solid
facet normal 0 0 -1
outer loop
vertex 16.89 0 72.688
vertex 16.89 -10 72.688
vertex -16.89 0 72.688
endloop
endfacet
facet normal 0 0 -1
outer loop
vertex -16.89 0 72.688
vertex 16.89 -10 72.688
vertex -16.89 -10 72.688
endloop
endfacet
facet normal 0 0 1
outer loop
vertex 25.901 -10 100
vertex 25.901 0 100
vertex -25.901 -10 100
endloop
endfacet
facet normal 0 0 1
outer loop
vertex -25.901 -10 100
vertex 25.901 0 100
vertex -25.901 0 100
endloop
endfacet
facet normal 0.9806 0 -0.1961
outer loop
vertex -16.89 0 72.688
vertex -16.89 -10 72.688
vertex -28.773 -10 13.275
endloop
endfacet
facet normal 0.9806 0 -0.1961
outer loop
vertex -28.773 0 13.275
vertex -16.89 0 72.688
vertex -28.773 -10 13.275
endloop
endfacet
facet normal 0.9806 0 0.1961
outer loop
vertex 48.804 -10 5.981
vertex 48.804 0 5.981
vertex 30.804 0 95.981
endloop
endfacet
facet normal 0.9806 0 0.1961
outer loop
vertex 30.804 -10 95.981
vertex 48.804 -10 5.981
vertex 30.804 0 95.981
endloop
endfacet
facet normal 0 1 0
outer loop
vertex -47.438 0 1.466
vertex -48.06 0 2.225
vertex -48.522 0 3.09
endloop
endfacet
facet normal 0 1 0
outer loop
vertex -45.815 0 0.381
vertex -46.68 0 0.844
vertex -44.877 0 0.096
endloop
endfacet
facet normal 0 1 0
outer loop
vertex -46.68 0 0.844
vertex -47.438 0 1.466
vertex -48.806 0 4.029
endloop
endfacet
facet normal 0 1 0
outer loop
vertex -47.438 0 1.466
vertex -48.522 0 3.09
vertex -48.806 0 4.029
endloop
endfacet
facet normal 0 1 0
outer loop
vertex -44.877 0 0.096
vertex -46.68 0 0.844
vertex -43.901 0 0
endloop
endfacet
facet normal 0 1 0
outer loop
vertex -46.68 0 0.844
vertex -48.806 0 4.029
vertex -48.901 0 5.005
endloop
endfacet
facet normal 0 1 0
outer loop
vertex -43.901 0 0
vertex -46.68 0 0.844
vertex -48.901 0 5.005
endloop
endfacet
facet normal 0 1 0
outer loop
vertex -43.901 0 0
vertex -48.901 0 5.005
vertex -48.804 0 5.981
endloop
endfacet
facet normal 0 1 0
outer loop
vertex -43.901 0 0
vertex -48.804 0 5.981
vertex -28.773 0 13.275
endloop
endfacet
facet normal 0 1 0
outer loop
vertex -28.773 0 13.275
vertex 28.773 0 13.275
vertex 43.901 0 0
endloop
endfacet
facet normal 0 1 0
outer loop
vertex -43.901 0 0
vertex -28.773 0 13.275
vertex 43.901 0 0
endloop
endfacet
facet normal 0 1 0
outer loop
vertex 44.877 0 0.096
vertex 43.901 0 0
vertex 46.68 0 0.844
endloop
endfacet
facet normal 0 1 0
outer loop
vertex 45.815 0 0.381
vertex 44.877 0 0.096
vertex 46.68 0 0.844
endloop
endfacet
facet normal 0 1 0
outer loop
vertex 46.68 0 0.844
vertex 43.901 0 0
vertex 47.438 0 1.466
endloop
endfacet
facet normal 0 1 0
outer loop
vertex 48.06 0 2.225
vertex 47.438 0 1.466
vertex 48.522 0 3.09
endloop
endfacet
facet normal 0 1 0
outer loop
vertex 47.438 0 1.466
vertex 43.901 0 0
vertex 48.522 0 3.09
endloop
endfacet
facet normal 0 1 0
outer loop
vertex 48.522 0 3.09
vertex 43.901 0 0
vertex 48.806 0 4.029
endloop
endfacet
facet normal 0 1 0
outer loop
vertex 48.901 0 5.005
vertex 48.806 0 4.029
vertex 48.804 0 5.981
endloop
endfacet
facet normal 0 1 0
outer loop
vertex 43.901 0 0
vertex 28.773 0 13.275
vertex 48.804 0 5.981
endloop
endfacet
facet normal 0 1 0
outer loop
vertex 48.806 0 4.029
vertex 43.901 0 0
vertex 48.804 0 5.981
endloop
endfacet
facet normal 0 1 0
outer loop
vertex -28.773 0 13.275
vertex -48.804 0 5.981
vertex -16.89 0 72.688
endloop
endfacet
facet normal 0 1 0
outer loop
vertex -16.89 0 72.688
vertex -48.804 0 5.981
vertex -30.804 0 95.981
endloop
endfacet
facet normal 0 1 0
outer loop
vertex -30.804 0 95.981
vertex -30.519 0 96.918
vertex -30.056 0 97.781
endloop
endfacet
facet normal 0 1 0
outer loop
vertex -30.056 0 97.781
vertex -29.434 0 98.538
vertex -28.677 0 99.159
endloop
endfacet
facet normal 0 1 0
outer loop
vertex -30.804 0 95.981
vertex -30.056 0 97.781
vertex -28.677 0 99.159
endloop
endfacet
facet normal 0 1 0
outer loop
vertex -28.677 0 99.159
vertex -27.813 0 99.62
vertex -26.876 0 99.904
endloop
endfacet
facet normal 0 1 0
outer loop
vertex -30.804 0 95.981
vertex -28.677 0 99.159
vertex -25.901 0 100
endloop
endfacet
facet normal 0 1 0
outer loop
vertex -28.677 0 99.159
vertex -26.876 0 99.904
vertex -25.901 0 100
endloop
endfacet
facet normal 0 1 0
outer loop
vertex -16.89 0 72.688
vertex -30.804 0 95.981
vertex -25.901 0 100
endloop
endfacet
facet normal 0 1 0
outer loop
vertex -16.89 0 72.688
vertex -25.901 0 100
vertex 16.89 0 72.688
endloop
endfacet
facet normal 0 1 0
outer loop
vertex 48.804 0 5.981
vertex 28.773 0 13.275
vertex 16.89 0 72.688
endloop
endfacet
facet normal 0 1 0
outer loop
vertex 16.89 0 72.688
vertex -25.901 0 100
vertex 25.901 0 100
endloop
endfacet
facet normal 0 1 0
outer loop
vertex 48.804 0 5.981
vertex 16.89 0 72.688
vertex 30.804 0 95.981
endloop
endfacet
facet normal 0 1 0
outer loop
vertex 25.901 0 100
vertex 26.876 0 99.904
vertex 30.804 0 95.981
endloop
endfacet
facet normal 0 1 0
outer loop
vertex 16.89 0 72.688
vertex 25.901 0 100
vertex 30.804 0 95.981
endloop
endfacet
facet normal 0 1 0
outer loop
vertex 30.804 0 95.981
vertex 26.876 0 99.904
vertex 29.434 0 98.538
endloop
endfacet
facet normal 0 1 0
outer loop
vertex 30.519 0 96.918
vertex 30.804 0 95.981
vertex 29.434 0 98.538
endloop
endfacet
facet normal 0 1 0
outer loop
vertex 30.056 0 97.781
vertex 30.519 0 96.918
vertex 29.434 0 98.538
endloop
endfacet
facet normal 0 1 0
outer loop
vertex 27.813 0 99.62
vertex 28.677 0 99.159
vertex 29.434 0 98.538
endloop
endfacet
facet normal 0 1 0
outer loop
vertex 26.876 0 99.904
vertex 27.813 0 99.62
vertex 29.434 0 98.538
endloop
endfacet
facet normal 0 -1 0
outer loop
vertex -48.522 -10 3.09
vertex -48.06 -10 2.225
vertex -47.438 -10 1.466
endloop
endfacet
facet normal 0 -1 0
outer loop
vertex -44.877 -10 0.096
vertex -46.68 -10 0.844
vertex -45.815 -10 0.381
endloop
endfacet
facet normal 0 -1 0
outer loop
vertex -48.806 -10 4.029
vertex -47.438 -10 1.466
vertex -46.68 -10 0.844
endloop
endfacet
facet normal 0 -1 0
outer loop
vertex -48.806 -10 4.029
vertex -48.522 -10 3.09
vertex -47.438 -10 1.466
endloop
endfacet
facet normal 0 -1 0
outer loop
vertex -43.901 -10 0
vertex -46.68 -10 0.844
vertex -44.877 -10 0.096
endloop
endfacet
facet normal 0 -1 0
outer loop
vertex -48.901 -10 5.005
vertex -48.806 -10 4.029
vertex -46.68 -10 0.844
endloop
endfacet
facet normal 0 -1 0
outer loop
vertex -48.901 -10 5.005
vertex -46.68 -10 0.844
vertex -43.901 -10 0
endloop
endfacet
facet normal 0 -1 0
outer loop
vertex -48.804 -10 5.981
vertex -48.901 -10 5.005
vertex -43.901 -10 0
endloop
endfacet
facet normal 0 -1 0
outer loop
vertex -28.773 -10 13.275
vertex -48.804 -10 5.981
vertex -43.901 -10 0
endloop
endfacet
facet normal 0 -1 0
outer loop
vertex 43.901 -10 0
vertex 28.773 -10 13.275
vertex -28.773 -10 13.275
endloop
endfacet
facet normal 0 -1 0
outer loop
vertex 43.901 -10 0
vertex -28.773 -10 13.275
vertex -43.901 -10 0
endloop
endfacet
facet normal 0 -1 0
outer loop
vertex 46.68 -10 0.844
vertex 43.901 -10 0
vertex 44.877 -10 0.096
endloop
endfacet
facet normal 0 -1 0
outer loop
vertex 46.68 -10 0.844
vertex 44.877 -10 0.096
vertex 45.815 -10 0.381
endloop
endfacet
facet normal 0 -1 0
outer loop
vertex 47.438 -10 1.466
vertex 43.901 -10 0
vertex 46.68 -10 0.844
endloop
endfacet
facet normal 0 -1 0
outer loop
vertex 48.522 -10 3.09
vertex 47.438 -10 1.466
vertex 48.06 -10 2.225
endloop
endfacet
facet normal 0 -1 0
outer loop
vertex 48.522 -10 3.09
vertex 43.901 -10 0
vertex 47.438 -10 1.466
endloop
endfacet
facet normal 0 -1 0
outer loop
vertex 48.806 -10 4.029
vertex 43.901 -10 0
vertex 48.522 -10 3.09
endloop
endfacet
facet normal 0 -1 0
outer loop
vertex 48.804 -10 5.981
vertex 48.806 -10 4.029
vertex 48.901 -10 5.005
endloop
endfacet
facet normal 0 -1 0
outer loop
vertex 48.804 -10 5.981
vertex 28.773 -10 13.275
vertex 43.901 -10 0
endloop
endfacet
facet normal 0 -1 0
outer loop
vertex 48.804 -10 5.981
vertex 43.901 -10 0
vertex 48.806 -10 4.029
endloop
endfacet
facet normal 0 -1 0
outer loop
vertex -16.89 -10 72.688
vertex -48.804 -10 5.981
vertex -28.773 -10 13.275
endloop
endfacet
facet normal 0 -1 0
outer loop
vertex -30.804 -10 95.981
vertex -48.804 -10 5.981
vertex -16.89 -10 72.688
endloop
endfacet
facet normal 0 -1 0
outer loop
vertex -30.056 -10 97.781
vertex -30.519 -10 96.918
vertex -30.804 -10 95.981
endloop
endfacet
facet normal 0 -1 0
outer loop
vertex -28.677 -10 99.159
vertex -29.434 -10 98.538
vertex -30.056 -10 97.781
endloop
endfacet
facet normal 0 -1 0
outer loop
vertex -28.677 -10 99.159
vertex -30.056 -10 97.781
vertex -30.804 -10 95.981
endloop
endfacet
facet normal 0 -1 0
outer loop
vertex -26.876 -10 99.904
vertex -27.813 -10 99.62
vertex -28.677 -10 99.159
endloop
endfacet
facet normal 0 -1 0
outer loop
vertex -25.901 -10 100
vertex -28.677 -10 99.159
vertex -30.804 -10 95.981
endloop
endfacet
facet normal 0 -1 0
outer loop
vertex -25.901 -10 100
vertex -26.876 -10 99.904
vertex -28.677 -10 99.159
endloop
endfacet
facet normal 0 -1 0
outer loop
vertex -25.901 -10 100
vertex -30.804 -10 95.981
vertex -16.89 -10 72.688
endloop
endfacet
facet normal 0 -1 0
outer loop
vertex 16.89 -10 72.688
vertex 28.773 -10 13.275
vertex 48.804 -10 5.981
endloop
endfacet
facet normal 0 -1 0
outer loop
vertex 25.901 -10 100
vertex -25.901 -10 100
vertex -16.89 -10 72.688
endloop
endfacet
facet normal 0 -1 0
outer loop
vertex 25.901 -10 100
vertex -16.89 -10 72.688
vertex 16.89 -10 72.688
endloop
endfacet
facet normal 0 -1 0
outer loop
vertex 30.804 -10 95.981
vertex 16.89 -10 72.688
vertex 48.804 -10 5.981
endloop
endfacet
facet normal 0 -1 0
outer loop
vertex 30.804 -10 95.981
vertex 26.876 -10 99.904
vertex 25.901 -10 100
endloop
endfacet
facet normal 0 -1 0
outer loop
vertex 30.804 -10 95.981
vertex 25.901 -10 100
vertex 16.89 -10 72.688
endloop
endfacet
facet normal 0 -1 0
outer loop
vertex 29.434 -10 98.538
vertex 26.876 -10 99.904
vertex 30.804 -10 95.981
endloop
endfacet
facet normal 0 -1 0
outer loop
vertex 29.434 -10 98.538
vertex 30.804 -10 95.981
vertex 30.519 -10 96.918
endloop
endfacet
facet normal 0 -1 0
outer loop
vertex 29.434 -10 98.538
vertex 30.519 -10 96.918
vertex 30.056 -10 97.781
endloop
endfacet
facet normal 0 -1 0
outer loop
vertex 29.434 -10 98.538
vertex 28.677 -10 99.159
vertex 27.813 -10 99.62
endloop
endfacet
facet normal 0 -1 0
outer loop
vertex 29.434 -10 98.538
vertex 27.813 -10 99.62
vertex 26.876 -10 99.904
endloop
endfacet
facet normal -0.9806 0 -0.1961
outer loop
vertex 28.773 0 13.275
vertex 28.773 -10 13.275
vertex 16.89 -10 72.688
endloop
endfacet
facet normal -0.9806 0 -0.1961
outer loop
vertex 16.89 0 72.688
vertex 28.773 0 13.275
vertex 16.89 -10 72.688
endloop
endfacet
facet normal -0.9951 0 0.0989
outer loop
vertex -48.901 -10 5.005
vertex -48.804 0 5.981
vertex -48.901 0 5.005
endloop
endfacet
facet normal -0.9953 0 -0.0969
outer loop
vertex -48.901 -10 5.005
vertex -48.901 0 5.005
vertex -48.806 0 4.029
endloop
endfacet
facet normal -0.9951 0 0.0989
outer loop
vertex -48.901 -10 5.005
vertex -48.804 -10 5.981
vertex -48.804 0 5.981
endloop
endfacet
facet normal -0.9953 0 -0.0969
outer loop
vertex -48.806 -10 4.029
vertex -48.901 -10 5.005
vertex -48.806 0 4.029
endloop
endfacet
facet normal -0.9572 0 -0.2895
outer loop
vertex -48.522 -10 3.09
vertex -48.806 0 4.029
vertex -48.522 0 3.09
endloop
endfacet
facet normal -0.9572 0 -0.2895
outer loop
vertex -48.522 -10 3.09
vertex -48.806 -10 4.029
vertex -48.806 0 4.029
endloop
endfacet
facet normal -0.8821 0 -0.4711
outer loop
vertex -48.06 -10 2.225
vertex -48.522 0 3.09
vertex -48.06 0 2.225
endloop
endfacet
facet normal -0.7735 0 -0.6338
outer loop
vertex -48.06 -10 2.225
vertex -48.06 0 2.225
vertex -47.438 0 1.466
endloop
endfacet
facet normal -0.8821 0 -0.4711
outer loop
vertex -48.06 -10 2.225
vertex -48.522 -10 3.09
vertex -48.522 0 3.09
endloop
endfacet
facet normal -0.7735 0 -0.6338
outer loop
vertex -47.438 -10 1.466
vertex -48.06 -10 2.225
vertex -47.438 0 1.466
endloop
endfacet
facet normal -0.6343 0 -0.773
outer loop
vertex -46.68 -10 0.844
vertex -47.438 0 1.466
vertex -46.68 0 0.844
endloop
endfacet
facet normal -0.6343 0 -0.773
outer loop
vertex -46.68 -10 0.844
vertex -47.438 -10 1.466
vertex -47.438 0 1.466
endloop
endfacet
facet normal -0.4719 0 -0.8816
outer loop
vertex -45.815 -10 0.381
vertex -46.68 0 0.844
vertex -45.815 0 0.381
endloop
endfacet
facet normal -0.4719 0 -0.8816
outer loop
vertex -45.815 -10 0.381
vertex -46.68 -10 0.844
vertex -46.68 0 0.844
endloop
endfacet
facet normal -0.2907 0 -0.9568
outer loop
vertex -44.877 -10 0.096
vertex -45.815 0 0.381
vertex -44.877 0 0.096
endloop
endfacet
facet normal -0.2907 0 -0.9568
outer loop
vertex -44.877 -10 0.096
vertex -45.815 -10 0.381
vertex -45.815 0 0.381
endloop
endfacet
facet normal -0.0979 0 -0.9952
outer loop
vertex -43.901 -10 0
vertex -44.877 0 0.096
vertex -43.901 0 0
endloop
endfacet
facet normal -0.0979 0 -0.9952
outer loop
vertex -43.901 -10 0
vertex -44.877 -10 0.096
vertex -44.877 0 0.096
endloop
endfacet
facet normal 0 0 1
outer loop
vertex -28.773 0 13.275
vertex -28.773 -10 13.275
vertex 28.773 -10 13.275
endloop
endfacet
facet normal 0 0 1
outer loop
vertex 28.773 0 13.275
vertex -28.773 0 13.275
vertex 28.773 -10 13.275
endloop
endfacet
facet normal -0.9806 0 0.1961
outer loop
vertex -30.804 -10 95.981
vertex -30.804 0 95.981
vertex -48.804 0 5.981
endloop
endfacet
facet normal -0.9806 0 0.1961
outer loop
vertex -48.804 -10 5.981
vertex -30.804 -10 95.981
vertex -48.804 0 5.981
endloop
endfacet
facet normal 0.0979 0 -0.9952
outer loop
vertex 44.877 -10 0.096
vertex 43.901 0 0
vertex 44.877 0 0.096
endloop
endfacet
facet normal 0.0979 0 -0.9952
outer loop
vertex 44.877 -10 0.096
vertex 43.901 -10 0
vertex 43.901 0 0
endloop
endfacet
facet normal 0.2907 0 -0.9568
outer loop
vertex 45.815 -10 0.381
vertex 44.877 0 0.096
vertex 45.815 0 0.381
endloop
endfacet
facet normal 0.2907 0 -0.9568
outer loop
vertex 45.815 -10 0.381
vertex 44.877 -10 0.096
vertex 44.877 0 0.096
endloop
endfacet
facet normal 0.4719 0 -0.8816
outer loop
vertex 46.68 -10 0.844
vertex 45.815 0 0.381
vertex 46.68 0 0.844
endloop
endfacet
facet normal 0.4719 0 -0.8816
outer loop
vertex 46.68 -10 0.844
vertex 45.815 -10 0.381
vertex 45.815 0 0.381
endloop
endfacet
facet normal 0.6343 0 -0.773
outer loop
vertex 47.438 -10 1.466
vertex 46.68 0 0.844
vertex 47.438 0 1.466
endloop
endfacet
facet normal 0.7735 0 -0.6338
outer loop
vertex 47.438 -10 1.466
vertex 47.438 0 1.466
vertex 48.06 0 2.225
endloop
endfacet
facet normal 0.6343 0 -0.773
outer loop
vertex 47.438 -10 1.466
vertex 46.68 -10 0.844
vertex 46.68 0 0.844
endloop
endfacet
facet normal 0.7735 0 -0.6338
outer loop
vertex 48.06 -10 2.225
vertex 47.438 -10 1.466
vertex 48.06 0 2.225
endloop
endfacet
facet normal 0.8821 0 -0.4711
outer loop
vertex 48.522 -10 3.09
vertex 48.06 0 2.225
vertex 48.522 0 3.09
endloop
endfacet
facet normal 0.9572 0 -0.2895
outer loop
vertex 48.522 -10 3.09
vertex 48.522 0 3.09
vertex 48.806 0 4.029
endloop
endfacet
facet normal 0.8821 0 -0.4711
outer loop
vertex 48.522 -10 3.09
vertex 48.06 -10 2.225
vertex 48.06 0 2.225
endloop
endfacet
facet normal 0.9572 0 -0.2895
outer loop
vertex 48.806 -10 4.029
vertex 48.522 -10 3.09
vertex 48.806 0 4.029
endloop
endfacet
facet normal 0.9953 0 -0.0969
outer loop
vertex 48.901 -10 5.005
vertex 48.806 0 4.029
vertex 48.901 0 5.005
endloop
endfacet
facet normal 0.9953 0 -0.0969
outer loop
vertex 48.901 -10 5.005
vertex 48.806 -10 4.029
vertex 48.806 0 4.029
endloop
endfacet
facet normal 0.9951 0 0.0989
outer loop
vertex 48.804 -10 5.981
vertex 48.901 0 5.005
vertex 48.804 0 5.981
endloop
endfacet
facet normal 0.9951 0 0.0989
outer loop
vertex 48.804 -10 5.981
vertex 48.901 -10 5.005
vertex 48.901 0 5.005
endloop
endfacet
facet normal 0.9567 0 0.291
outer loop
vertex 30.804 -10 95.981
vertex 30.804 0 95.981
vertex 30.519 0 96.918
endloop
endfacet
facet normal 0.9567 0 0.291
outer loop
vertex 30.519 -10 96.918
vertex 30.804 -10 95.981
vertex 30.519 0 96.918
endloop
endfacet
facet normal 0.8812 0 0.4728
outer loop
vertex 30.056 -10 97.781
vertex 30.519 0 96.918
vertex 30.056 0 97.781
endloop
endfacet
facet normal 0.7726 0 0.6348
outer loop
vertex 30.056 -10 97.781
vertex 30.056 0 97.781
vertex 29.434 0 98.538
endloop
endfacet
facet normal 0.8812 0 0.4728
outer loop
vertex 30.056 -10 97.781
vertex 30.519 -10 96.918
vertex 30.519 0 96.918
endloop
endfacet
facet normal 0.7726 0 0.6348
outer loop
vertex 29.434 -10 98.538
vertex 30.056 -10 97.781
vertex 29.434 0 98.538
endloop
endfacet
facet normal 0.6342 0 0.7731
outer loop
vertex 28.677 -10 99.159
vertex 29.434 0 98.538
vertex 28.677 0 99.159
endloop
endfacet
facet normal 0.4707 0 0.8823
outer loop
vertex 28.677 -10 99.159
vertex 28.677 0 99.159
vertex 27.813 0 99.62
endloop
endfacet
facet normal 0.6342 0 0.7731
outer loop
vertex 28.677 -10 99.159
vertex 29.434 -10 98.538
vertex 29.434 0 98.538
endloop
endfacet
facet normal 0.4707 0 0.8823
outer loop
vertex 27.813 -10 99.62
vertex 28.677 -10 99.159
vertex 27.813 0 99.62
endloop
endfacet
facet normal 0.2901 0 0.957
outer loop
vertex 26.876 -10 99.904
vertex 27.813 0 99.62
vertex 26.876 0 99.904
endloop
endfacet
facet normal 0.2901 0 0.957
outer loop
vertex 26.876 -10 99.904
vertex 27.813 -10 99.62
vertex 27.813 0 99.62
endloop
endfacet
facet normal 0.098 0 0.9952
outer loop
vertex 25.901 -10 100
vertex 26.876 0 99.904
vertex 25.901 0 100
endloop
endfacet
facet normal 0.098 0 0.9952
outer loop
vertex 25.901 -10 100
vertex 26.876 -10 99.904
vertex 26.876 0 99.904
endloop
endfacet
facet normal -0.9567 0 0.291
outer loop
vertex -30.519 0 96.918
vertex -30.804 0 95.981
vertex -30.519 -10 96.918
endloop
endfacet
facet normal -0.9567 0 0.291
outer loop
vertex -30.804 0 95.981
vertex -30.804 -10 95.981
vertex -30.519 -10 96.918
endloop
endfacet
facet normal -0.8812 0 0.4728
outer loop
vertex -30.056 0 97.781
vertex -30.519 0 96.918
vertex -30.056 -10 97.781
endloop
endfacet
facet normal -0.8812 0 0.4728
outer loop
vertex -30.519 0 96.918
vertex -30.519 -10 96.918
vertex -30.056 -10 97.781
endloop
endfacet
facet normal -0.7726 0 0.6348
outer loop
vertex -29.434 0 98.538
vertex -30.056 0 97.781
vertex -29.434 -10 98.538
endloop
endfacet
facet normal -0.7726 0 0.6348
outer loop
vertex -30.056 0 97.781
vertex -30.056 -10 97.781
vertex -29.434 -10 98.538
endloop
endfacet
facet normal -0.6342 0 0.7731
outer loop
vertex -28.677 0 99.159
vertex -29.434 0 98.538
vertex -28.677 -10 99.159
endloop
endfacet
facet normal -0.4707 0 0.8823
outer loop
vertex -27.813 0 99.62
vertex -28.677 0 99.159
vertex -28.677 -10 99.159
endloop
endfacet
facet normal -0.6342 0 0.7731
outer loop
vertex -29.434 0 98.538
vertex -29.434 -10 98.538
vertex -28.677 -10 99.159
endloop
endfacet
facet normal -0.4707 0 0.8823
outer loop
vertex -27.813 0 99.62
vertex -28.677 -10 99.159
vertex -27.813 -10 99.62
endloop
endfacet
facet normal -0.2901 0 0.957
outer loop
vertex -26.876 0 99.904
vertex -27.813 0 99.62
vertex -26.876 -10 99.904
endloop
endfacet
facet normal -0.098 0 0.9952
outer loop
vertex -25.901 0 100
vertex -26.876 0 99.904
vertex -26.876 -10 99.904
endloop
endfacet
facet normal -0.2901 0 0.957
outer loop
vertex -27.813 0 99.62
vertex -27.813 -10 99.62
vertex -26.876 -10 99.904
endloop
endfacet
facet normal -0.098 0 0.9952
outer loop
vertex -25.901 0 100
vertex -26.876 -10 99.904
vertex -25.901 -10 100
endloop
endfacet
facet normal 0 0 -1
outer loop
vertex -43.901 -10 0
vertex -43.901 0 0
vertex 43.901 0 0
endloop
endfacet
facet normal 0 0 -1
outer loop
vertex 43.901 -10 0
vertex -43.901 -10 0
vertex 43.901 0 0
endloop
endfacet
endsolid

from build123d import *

# Parameters (mm, degrees)
F1_DEPTH = 10
F2_R     = 5
F4_DEPTH = 10.001


with BuildPart() as f1:
    # F0 (on Front) → F1 (new body)
    with BuildSketch(Plane.XZ):
        Polygon((-30, 100), (-50, 0), (50, 0), (30, 100), align=None)
    extrude(amount=F1_DEPTH)

    # F2
    f2_edges = [f1.edges().sort_by_distance(p)[0] for p in [
        (-30, -5, 100),
        (30, -5, 100),
        (-50, -5, 0),
        (50, -5, 0),
    ]]
    fillet(f2_edges, radius=F2_R)

    # F3 (on face) → F4 (cut, through all)
    with BuildSketch(Plane.XZ.offset(10)):
        Polygon((-16.890058, 72.688381), (-28.772679, 13.275276), (28.772679, 13.275276), (16.890058, 72.688381), align=None)
    extrude(amount=-F4_DEPTH, mode=Mode.SUBTRACT)


solid = f1.part
